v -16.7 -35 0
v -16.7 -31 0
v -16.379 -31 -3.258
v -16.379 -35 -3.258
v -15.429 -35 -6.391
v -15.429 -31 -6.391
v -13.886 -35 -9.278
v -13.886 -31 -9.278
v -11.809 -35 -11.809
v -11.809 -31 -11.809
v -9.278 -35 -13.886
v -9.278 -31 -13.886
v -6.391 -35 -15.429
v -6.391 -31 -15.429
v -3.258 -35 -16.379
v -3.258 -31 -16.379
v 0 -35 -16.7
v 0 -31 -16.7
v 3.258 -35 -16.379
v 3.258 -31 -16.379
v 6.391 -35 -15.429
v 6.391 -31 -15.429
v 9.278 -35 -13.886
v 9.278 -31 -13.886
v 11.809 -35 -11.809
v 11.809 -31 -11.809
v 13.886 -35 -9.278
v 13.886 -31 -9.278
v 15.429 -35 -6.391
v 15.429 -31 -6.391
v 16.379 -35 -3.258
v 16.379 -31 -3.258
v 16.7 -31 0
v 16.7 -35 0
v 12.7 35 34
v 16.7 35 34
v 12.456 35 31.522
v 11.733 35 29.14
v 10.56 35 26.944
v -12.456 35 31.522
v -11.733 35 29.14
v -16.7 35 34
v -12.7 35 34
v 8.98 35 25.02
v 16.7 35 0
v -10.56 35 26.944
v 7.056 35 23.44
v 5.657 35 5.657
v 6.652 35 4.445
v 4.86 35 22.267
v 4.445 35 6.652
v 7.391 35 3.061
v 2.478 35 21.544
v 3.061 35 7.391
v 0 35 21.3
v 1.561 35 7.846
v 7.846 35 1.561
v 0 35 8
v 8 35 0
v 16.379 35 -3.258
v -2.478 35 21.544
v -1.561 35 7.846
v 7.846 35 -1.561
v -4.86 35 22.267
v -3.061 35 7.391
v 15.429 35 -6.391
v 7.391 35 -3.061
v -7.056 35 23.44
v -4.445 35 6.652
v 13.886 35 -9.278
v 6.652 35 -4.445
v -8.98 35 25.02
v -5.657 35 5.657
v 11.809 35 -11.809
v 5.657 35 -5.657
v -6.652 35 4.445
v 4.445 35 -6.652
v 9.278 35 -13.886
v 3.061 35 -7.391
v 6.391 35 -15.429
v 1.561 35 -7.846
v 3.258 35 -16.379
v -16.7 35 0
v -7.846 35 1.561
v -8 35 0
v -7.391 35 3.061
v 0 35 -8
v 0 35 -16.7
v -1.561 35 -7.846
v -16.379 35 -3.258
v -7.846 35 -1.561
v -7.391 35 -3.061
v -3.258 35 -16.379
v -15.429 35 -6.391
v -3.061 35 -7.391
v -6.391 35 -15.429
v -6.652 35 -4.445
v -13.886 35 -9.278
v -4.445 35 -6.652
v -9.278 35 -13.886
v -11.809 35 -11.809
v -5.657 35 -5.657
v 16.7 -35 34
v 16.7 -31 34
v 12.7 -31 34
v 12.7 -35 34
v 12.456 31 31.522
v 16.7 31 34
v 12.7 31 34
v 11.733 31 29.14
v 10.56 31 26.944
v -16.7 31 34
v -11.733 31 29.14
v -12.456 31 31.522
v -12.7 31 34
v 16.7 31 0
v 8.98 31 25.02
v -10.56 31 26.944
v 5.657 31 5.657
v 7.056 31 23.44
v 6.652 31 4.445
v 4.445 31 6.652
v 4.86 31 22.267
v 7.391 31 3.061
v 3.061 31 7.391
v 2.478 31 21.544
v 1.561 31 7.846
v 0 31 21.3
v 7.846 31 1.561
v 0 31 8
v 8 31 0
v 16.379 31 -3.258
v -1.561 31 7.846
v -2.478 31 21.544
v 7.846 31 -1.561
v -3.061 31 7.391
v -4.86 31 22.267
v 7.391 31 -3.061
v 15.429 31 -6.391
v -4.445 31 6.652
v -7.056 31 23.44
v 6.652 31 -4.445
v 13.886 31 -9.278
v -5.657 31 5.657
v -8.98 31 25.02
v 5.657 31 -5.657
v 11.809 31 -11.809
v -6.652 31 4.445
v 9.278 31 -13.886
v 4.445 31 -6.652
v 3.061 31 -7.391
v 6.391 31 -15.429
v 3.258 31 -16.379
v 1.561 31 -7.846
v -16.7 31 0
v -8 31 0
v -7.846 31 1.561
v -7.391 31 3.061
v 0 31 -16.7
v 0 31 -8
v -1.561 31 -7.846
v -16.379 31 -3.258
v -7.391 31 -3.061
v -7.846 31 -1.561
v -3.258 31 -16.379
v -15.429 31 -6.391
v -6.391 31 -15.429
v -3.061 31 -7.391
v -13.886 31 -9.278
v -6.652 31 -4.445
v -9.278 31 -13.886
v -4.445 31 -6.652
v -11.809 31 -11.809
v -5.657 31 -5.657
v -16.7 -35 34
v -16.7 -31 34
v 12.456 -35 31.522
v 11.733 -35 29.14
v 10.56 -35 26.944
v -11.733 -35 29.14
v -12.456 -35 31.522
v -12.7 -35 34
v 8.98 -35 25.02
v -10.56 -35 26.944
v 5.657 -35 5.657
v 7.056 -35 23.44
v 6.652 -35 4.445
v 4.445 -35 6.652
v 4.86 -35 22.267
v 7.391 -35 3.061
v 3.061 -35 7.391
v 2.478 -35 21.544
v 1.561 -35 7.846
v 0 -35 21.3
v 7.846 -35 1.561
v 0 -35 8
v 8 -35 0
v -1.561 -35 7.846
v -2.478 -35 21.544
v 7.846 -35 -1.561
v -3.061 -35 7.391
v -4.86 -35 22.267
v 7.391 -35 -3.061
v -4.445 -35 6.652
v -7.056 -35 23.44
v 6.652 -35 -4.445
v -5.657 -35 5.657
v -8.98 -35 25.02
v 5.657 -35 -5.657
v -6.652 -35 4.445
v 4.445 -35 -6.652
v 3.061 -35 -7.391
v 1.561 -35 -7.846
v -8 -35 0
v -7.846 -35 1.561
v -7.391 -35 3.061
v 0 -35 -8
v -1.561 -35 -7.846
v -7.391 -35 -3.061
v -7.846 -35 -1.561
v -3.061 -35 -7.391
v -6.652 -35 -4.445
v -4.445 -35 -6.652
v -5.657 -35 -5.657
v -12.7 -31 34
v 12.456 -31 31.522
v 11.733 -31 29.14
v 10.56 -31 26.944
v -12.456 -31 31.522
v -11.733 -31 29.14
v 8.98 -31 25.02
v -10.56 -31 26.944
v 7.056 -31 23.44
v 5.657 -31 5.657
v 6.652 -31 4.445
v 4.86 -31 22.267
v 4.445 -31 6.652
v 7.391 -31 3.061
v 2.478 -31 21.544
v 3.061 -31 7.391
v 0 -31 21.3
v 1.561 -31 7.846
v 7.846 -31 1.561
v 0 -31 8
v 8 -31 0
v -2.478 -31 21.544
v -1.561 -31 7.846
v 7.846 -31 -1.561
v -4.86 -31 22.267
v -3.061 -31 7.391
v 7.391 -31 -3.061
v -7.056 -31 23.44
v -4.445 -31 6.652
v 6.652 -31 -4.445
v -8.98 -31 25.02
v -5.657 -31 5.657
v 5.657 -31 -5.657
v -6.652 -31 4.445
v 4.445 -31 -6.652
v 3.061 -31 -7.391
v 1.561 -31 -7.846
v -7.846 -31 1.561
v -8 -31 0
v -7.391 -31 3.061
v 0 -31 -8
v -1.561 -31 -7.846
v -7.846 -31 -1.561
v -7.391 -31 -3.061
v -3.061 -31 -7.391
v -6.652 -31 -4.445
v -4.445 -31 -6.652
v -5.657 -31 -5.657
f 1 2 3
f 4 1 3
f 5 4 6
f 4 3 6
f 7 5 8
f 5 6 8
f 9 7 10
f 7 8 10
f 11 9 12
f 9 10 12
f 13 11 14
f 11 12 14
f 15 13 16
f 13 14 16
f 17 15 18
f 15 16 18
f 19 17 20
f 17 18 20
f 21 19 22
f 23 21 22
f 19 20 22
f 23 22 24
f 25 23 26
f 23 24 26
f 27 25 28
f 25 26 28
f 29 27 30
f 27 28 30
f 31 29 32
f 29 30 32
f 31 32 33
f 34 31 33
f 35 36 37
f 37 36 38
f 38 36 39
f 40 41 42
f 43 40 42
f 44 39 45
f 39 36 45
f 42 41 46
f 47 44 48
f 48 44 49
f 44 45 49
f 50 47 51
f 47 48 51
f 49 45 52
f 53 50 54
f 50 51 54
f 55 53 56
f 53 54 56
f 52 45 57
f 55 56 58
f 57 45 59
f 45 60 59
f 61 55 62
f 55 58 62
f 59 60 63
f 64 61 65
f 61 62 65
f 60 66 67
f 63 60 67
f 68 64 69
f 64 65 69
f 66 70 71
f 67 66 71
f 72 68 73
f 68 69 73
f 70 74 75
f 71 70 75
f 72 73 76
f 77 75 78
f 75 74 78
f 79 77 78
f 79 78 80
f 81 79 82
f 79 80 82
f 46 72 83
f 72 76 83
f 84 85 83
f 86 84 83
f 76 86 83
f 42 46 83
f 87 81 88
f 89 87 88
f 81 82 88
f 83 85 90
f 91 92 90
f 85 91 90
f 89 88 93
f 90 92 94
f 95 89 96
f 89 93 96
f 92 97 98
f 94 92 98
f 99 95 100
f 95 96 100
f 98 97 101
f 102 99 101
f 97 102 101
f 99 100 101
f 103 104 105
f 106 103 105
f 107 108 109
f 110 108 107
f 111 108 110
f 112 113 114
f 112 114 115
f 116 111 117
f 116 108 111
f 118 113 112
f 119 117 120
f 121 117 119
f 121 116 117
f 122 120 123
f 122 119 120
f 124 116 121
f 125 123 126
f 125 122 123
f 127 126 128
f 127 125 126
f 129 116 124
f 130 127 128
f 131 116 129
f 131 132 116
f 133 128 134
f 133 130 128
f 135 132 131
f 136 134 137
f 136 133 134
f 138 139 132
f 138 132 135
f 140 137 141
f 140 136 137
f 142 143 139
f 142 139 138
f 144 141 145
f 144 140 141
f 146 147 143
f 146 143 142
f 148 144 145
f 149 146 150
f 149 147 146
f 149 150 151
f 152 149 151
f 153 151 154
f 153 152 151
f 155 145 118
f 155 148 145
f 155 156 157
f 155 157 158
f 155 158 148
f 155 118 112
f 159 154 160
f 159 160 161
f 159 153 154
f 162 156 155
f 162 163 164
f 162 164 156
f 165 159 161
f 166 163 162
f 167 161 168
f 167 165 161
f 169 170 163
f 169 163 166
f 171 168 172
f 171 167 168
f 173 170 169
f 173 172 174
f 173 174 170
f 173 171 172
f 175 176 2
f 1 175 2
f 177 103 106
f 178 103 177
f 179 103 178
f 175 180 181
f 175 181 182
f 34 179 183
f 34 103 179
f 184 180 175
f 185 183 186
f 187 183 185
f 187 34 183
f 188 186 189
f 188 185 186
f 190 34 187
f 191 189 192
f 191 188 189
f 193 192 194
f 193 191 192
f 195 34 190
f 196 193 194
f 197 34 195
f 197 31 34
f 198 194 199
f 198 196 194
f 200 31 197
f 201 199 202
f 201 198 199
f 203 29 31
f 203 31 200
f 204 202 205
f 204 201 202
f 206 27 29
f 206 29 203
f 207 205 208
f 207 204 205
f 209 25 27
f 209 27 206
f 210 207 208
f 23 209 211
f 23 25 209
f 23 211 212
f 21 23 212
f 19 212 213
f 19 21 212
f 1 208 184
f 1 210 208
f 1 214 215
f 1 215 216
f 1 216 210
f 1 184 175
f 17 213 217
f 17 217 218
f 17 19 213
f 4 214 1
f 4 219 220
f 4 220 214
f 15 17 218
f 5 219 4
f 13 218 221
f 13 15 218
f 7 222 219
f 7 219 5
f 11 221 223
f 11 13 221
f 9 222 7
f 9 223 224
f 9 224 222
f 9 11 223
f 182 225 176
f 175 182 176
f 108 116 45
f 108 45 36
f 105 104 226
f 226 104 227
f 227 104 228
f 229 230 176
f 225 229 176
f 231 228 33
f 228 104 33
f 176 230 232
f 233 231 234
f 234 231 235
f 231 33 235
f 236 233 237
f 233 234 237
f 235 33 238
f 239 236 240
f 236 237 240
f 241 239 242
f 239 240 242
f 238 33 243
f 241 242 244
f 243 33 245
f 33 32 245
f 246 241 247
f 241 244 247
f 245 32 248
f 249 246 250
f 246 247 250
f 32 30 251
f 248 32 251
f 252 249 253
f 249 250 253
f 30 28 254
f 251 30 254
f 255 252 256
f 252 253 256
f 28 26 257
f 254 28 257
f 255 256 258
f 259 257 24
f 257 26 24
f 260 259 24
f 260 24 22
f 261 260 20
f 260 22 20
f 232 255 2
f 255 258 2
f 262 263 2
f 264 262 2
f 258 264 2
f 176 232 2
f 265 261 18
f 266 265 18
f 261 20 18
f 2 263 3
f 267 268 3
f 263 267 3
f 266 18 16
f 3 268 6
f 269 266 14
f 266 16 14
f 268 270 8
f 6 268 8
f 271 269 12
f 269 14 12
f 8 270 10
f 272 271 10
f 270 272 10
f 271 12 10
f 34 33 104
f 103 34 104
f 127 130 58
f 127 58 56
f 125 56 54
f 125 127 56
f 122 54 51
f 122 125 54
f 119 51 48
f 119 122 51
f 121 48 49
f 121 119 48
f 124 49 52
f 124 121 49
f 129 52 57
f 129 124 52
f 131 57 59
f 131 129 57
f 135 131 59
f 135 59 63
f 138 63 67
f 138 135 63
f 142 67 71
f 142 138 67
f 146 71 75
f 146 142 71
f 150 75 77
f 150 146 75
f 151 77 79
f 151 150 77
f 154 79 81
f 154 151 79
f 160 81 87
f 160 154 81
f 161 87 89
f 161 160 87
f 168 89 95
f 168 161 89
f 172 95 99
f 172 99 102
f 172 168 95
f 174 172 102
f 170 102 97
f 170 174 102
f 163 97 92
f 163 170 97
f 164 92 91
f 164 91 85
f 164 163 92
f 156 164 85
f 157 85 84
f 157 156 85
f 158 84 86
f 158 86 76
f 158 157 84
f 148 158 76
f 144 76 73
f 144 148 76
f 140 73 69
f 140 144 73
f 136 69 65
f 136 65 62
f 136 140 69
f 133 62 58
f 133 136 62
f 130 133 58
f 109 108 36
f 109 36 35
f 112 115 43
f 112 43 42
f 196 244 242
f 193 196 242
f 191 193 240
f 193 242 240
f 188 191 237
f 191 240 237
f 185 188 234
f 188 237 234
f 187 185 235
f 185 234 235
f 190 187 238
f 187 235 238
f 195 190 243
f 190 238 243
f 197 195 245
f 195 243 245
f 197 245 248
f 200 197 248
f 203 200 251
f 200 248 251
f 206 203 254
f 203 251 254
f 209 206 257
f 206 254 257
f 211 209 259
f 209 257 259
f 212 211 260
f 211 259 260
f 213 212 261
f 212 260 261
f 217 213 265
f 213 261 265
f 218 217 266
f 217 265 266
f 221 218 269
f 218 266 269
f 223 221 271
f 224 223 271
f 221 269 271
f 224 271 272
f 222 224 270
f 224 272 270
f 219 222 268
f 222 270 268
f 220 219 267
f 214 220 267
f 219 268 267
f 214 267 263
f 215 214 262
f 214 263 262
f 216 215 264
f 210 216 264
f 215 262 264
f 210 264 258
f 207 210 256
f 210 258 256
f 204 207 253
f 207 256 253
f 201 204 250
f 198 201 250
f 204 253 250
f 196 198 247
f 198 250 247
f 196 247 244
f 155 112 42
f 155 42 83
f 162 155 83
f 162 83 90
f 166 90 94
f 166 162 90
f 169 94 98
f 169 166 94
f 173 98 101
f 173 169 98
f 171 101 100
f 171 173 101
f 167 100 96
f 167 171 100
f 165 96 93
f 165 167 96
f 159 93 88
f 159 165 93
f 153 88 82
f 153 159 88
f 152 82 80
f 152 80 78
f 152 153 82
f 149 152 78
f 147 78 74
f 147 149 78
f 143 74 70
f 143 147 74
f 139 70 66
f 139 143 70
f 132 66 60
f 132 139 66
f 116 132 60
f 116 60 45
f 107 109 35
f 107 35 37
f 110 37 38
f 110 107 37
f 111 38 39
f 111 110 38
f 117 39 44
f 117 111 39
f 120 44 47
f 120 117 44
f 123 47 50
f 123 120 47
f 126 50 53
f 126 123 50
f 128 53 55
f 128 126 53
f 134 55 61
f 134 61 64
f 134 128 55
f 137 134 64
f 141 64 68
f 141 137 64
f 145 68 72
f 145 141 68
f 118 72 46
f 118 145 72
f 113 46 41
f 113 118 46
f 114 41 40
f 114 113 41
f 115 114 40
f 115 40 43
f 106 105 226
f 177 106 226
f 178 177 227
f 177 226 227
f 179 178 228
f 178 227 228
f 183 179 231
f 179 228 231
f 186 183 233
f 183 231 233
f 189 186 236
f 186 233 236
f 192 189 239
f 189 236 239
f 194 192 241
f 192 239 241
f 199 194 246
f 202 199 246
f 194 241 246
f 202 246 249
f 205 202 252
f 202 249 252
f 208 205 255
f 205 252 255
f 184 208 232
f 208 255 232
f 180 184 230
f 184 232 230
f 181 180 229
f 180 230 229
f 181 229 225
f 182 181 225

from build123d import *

# Parameters (mm, degrees)
SKETCH1_R           = 8
BOSS_EXTRUDE1_DEPTH = 4


with BuildPart() as part:
    # Sketch1 → Boss-Extrude1 (new body)
    with BuildSketch(Plane(origin=(0, 31, 0), x_dir=(1, 0, 0), z_dir=(0, 1, 0))):
        with BuildLine():
            Line((16.7, -34), (12.7, -34))
            ThreePointArc((12.7, -34), (0, -21.3), (-12.7, -34))
            Line((-12.7, -34), (-16.7, -34))
            Line((-16.7, -34), (-16.7, 0))
            ThreePointArc((-16.7, 0), (0, 16.7), (16.7, 0))
            Line((16.7, 0), (16.7, -34))
        make_face()
        Circle(SKETCH1_R, mode=Mode.SUBTRACT)
    extrude(amount=BOSS_EXTRUDE1_DEPTH)


with BuildPart() as body_2:
    # Mirror2: mirrored copy
    add(part.part.mirror(Plane.ZX))


solid = Compound([part.part, body_2.part])
